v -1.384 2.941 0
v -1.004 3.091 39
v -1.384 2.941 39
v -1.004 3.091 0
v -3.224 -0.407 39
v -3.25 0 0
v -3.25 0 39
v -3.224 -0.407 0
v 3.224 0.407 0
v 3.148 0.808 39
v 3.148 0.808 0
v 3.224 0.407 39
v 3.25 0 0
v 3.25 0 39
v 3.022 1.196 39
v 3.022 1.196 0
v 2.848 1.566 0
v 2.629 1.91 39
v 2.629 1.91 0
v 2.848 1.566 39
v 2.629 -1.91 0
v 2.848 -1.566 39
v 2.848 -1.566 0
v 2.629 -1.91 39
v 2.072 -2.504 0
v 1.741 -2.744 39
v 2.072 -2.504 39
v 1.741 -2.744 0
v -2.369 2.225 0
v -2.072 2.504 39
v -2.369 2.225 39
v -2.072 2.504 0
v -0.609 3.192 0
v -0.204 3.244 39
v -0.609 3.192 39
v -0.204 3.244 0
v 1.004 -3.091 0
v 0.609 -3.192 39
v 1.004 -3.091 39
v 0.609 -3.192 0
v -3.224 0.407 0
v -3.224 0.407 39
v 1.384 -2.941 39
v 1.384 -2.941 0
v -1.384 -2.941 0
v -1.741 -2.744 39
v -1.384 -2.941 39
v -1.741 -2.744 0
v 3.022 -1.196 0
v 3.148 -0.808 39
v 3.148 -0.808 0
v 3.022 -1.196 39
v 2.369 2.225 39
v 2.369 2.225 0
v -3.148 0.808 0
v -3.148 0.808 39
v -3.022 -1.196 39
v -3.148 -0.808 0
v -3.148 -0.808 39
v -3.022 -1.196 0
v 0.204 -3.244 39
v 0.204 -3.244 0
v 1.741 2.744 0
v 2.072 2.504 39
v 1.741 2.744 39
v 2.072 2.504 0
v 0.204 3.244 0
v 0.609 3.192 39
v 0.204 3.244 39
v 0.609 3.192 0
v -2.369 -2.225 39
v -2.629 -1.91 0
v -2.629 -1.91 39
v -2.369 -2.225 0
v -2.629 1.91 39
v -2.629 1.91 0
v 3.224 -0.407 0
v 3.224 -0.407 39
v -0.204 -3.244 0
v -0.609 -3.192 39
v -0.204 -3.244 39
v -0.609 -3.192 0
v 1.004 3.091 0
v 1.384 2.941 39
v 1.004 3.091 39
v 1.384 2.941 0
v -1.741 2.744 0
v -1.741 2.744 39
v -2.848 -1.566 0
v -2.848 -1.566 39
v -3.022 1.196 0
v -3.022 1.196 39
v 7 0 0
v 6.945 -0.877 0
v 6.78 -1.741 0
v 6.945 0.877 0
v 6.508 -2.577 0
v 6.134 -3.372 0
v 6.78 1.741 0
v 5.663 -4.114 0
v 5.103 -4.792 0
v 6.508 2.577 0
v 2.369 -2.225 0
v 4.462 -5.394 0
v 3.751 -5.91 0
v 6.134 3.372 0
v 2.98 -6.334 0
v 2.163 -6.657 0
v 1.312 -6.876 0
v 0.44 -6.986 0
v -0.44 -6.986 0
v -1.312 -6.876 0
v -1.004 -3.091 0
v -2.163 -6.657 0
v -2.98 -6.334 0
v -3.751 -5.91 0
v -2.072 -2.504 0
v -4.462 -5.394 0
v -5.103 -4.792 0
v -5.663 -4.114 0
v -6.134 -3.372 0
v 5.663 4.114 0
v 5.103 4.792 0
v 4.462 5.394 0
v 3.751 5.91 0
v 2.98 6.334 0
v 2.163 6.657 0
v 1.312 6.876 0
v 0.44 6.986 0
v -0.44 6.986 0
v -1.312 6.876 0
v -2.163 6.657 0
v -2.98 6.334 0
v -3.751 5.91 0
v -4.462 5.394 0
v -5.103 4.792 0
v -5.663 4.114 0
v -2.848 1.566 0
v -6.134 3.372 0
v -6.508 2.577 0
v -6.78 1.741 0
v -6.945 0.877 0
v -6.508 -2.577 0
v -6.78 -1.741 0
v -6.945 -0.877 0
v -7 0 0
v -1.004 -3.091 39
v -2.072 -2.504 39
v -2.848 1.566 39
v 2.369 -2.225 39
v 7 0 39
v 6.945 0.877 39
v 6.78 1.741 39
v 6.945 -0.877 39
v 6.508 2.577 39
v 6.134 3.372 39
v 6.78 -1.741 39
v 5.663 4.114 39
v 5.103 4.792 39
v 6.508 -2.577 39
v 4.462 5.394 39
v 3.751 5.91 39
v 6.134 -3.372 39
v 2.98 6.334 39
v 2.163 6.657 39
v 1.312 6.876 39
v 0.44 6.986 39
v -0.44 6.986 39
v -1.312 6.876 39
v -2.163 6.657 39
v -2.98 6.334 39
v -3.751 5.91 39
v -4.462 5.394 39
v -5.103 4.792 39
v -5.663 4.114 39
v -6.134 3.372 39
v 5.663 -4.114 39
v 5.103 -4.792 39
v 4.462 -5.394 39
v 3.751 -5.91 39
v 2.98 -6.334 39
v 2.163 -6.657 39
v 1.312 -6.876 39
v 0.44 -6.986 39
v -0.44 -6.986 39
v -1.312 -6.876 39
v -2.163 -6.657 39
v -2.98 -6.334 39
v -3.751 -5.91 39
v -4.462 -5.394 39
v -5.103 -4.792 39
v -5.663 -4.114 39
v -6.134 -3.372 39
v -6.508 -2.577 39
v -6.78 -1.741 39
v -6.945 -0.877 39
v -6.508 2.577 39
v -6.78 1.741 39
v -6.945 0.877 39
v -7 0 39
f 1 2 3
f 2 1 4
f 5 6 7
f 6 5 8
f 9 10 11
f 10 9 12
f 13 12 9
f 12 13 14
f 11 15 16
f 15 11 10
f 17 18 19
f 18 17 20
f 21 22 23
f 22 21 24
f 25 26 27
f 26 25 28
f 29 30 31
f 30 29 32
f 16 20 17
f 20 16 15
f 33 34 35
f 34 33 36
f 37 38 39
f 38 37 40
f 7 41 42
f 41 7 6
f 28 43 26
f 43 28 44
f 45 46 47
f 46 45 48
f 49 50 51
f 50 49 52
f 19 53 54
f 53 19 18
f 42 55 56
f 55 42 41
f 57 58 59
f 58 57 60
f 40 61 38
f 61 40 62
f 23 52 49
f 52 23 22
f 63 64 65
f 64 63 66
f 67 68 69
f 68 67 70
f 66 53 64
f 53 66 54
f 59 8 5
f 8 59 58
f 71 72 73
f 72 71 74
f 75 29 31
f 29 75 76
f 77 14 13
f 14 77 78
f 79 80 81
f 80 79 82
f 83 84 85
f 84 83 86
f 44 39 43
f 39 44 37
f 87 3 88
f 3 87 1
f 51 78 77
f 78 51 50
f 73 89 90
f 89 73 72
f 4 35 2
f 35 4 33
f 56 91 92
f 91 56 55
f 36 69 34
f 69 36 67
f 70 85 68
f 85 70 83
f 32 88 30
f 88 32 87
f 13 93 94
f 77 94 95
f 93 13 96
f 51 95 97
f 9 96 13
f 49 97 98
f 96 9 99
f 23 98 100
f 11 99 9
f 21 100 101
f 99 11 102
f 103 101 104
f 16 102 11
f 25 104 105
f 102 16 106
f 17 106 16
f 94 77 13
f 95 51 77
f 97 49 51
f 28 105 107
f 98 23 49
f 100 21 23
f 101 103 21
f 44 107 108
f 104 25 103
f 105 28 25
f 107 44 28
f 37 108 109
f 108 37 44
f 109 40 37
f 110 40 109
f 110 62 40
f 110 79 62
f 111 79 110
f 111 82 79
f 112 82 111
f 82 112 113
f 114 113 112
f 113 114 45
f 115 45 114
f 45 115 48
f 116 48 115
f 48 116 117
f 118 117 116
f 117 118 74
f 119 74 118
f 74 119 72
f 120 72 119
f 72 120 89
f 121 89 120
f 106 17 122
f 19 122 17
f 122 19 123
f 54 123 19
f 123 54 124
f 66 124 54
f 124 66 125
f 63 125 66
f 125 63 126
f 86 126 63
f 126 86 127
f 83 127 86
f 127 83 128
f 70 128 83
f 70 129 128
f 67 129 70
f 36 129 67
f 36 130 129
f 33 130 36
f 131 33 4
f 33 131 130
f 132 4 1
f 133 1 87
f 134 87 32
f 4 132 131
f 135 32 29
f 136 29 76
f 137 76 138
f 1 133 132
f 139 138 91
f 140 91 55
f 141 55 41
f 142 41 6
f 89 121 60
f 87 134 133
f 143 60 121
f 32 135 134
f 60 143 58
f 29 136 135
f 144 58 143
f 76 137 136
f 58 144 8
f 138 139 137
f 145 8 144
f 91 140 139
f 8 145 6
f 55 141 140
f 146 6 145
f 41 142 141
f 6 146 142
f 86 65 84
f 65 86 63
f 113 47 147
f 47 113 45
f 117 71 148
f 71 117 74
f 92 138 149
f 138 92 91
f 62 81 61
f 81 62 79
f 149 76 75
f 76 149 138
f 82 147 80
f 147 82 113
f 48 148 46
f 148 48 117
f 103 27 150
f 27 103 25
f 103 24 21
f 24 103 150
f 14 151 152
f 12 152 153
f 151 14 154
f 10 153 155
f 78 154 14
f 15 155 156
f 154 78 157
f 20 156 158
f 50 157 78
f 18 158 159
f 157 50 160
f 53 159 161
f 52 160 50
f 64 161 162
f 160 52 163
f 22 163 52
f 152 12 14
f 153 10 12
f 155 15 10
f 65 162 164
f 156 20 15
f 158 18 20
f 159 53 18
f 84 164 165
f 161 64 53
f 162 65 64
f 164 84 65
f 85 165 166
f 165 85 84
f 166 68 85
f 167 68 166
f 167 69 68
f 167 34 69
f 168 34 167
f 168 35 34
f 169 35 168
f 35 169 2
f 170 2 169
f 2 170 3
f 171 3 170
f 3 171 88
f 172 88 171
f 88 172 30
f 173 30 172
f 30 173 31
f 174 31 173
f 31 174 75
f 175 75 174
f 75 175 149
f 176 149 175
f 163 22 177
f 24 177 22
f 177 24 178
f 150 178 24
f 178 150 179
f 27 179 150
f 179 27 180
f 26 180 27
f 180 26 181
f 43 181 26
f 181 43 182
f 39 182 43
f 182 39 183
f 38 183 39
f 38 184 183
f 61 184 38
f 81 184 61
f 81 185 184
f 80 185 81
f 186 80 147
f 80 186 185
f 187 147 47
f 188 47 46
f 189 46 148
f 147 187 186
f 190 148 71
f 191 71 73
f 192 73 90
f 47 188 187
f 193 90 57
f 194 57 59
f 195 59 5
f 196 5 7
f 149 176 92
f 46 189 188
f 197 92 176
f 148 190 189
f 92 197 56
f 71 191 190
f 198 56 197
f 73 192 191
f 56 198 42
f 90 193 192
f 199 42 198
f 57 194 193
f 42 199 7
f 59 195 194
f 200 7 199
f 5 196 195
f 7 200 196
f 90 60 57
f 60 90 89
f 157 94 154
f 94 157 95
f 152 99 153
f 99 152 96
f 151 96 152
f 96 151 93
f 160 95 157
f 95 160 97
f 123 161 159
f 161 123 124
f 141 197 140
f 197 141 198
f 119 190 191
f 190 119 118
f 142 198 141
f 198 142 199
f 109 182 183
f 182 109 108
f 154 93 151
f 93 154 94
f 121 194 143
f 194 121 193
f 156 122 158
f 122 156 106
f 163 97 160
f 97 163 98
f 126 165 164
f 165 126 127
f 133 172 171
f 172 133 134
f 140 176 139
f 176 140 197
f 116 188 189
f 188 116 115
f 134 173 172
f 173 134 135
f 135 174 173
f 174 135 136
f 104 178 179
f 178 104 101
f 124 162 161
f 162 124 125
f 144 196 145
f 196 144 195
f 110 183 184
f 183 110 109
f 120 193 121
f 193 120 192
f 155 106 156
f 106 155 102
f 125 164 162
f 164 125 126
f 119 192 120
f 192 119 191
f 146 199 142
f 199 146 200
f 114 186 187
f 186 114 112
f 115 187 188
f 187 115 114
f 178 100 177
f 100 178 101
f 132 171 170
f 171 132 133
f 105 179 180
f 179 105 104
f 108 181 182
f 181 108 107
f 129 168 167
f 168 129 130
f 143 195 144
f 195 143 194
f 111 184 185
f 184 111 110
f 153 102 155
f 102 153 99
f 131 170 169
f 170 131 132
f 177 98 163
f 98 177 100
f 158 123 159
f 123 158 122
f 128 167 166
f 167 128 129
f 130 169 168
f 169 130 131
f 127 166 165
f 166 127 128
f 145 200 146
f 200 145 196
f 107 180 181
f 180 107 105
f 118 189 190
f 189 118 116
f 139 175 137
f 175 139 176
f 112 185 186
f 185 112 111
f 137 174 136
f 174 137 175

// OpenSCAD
$fn = 50;


difference() {
	union() {
		cylinder(h = 39, r = 7.0000000000);
	}
	union() {
		cylinder(h = 39, r = 3.2500000000);
		cylinder(h = 39, r = 1.8000000000);
		cylinder(h = 39, r = 1.8000000000);
		cylinder(h = 39, r = 1.8000000000);
	}
}
